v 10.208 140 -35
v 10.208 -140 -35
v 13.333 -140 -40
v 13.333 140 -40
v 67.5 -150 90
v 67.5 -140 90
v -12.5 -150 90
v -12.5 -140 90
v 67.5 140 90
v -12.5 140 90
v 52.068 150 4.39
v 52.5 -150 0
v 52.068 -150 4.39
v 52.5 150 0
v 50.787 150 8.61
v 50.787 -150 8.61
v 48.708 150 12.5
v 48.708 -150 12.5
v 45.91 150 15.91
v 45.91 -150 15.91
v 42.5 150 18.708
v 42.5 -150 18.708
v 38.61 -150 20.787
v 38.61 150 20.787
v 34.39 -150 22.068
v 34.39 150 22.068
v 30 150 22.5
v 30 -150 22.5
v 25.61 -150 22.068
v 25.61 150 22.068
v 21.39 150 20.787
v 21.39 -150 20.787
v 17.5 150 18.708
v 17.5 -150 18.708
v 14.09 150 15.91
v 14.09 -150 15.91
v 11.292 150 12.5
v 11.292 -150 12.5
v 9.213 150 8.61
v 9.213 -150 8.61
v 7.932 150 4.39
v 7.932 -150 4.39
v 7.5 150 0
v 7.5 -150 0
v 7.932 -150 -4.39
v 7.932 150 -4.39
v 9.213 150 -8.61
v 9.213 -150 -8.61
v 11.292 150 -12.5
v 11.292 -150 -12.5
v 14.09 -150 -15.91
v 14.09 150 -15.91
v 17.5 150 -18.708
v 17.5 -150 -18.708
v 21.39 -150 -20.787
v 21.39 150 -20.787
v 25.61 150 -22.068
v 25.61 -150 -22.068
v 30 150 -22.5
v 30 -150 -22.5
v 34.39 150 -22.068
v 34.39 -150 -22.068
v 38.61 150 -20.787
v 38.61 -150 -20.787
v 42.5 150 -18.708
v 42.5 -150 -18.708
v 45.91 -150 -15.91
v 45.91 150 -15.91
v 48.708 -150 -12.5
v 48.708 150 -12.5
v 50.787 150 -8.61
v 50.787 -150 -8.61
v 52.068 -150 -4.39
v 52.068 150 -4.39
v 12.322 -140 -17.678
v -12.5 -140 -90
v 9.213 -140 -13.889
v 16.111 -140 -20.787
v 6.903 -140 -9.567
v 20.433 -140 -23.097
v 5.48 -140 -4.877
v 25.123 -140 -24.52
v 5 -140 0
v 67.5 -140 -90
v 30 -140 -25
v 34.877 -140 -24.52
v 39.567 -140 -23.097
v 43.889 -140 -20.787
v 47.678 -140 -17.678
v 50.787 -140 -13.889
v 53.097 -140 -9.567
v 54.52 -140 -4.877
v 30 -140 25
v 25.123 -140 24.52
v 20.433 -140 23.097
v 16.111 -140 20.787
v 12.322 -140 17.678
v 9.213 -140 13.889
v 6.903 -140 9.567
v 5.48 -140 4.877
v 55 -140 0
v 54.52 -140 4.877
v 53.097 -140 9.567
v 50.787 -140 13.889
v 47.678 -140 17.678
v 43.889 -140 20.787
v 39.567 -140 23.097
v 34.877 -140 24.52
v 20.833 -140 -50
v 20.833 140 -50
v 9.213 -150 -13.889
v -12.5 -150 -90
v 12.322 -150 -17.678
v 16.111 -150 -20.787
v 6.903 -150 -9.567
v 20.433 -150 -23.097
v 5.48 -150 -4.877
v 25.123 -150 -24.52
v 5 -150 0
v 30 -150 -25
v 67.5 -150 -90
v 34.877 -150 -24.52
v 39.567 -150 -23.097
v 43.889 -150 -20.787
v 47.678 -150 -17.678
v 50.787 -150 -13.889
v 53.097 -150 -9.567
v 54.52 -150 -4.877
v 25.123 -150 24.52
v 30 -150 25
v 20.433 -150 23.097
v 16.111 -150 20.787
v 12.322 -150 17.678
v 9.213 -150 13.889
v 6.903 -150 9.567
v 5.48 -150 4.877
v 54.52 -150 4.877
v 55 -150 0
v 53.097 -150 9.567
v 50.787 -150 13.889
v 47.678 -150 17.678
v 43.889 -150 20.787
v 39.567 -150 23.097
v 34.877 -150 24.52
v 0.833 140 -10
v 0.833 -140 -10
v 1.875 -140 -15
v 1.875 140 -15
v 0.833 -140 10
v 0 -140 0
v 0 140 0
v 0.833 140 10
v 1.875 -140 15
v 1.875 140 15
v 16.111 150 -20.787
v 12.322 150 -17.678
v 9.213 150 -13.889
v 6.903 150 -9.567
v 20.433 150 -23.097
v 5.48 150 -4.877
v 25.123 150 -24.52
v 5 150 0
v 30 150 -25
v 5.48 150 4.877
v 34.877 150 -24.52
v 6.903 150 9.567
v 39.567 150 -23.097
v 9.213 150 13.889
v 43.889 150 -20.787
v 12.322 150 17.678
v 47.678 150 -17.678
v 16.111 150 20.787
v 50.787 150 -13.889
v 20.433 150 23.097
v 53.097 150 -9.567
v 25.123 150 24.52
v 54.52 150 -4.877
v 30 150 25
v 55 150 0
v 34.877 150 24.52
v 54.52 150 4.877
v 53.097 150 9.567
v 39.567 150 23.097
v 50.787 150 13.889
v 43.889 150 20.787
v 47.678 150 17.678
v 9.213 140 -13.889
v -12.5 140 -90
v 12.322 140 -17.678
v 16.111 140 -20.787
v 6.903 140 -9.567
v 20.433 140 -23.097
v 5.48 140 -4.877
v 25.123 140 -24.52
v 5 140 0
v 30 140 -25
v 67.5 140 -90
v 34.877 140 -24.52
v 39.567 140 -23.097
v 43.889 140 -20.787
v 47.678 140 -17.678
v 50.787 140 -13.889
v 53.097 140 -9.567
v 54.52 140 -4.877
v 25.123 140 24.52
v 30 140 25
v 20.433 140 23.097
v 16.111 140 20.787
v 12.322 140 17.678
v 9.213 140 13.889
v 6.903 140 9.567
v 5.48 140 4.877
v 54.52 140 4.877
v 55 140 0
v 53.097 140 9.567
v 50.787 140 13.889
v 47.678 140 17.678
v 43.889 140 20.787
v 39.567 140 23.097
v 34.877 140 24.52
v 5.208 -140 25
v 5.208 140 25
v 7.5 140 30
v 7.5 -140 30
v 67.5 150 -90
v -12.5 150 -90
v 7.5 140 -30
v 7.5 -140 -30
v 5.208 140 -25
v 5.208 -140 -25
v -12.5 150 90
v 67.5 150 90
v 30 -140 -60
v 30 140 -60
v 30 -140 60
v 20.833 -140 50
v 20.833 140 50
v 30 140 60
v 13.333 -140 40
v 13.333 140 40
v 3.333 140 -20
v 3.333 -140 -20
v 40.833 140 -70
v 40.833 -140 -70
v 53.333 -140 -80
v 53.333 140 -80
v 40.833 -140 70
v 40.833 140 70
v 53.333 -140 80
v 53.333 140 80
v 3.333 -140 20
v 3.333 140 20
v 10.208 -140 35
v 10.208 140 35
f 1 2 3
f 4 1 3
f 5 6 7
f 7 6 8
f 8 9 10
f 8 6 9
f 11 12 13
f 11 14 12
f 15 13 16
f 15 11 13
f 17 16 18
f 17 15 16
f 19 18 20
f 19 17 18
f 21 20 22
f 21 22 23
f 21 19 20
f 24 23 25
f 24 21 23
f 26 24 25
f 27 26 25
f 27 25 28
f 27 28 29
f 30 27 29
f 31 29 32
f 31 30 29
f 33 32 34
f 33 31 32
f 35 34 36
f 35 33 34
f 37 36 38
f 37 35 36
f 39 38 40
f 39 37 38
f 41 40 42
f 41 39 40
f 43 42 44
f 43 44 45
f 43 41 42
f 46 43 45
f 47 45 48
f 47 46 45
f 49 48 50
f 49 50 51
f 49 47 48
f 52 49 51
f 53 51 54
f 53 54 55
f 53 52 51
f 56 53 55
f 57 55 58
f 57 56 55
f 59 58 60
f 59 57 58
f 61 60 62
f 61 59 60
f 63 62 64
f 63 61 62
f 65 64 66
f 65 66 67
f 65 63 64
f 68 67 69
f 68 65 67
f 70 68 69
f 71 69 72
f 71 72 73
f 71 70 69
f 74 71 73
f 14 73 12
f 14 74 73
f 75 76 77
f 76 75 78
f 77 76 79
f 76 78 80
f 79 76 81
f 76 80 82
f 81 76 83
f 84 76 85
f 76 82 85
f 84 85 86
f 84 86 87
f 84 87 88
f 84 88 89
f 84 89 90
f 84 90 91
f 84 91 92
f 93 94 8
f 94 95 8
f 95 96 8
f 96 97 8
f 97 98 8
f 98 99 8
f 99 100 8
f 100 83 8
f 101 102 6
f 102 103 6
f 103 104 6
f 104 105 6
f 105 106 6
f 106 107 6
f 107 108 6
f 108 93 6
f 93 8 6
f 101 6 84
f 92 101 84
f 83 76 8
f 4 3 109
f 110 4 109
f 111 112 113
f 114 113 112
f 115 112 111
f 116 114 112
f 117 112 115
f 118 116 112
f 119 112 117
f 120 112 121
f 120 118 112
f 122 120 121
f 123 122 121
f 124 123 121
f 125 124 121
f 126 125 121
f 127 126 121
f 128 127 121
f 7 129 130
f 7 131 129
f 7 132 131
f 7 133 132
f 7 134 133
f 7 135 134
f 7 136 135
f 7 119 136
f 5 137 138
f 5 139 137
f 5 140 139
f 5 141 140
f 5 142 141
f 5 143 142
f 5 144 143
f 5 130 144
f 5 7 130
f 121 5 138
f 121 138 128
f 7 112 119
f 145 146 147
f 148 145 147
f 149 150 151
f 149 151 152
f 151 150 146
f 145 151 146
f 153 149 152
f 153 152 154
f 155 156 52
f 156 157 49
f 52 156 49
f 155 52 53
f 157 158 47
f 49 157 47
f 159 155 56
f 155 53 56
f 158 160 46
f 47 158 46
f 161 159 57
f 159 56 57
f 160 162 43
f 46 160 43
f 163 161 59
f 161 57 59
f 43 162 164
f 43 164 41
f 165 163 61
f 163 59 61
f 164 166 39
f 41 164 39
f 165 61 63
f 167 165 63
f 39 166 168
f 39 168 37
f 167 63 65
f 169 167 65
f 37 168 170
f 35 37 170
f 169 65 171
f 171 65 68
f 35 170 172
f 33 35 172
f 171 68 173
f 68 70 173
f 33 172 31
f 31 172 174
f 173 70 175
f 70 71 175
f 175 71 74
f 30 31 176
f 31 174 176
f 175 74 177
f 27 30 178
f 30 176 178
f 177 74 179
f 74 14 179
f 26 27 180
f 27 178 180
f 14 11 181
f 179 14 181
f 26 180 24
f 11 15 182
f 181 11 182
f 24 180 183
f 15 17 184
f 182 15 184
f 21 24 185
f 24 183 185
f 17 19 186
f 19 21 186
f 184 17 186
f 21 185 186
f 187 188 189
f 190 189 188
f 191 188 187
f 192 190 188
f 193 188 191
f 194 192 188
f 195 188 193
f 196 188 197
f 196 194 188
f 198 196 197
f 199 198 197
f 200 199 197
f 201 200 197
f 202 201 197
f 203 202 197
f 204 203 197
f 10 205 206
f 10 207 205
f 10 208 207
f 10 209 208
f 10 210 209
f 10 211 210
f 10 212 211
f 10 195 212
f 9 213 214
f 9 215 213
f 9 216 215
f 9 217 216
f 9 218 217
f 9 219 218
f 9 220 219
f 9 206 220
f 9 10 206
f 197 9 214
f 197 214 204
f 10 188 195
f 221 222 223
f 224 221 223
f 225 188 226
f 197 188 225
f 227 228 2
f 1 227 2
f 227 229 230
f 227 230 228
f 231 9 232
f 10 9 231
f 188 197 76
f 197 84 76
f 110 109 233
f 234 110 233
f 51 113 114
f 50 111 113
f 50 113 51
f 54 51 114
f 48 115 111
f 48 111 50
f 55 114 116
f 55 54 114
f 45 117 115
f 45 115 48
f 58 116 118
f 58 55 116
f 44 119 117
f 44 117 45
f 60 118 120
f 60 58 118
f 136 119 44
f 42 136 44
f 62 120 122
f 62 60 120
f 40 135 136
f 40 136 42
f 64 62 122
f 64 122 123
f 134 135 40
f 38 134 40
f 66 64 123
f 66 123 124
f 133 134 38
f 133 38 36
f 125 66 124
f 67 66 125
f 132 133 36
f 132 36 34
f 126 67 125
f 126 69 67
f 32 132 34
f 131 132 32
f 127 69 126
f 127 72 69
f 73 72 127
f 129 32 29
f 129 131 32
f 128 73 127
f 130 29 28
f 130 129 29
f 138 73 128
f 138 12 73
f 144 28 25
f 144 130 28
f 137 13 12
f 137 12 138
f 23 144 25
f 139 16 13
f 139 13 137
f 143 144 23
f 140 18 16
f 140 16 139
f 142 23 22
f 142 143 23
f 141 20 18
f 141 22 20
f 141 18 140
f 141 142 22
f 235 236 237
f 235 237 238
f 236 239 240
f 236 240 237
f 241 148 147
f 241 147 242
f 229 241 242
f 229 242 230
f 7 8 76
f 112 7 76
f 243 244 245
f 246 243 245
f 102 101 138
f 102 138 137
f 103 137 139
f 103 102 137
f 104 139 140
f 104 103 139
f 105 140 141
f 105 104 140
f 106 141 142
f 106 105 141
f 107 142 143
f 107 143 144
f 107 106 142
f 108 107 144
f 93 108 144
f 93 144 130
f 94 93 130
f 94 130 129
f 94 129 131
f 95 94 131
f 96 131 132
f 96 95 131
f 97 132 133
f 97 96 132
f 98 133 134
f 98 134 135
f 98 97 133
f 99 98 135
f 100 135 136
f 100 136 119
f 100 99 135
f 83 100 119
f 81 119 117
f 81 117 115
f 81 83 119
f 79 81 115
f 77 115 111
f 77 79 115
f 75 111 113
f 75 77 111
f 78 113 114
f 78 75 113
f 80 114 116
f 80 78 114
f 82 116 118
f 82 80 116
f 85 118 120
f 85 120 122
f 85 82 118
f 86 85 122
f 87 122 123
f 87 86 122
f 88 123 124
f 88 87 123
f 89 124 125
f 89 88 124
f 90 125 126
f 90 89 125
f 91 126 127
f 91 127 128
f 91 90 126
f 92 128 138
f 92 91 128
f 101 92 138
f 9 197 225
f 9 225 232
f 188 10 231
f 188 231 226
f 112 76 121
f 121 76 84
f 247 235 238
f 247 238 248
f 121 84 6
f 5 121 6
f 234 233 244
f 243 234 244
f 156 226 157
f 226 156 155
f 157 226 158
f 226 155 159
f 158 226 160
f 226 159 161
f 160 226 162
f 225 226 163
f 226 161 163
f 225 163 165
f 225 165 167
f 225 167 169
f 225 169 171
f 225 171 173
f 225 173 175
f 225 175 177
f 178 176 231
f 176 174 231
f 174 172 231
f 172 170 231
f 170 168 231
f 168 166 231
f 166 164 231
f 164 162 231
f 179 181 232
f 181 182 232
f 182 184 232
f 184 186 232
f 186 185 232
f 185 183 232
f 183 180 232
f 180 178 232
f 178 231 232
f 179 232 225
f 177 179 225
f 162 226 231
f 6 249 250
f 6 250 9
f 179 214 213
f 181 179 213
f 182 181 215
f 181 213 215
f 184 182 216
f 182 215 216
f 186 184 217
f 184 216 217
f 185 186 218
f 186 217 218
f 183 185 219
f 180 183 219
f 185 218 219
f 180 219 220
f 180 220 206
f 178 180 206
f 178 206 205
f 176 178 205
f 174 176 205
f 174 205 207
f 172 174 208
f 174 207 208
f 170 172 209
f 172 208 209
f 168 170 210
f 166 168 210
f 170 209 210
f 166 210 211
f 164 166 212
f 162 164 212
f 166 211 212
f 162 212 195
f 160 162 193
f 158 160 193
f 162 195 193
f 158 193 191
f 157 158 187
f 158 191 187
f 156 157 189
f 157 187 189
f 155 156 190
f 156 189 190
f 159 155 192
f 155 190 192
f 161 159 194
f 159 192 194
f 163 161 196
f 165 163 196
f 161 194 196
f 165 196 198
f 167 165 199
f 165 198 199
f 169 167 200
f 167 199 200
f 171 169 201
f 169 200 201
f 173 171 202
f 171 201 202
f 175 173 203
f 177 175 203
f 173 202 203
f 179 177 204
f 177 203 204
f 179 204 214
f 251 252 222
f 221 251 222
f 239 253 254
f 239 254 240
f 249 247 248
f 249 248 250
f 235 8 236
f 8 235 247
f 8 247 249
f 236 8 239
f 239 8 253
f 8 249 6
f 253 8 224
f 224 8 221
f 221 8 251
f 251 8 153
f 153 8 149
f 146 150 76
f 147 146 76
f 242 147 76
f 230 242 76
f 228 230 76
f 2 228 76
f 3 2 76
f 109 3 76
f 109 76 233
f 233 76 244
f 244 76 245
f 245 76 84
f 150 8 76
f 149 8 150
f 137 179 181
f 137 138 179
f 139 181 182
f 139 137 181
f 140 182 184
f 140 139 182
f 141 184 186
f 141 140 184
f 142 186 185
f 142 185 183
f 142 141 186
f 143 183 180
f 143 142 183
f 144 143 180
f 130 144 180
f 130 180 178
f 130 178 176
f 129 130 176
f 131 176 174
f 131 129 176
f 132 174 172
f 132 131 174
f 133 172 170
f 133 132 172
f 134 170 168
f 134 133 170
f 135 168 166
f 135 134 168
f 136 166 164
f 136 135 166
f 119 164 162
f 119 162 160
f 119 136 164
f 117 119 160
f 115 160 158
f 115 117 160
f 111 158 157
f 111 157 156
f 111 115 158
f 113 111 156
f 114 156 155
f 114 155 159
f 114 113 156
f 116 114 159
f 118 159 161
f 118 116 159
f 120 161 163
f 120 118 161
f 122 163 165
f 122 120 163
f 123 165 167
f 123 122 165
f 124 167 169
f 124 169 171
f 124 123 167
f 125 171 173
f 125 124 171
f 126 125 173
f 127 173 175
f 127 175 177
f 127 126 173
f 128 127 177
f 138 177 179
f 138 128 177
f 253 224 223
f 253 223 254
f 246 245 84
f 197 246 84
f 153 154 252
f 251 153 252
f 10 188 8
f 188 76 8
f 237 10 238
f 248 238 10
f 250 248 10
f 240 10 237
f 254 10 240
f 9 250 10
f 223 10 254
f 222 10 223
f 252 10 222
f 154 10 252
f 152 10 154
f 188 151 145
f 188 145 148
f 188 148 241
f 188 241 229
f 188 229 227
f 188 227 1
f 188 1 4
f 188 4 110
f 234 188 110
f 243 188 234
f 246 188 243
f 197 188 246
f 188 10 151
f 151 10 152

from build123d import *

# Parameters (mm, degrees)
F0_R     = 25
F0_R_2   = 22.5
F1_DEPTH = 150
F3_DEPTH = 140
F5_R     = 25
F6_DEPTH = 10


with BuildPart() as f1:
    # F0 (on Front) → F1 (new body, symmetric)
    with BuildSketch(Plane.XZ):
        with Locations((30, 0)):
            Circle(F0_R)
        with Locations((30, 0)):
            Circle(F0_R_2, mode=Mode.SUBTRACT)
    extrude(amount=F1_DEPTH, both=True)


with BuildPart() as f3:
    # F2 (on Front) → F3 (new body, symmetric)
    with BuildSketch(Plane.XZ):
        Polygon((-12.5, 0), (0, 0), (0.833, 10), (1.875, 15), (3.333, 20), (5.208, 25), (7.5, 30), (10.208, 35), (13.333, 40), (20.833, 50), (30, 60), (40.833, 70), (53.333, 80), (67.5, 90), (-12.5, 90), align=None)
    extrude(amount=F3_DEPTH, both=True)

    # F4: F3 across plane


with BuildPart() as f3_1:
    add(f3.part)
    add(f3.part.mirror(Plane.XY))


with BuildPart() as f6:
    # F5 (on face) → F6 (new body)
    with BuildSketch(Plane.XZ.offset(140)):
        Polygon((67.5, -90), (67.5, 90), (53.333, 80), (40.833, 70), (30, 60), (20.833, 50), (13.333, 40), (10.208, 35), (7.5, 30), (5.208, 25), (3.333, 20), (1.875, 15), (0.833, 10), (0, 0), (0.833, -10), (1.875, -15), (3.333, -20), (5.208, -25), (7.5, -30), (10.208, -35), (13.333, -40), (20.833, -50), (30, -60), (40.833, -70), (53.333, -80), align=None)
        with Locations((30, 0)):
            Circle(F5_R, mode=Mode.SUBTRACT)
        Polygon((53.333, 80), (67.5, 90), (-12.5, 90), (-12.5, -90), (67.5, -90), (53.333, -80), (40.833, -70), (30, -60), (20.833, -50), (13.333, -40), (10.208, -35), (7.5, -30), (5.208, -25), (3.333, -20), (1.875, -15), (0.833, -10), (0, 0), (0.833, 10), (1.875, 15), (3.333, 20), (5.208, 25), (7.5, 30), (10.208, 35), (13.333, 40), (20.833, 50), (30, 60), (40.833, 70), align=None)
    extrude(amount=F6_DEPTH)


with BuildPart() as f7_1:
    # F7: instance of F6
    add(f6.part.mirror(Plane.XZ))


solid = Compound([f1.part, f3_1.part, f6.part, f7_1.part])
